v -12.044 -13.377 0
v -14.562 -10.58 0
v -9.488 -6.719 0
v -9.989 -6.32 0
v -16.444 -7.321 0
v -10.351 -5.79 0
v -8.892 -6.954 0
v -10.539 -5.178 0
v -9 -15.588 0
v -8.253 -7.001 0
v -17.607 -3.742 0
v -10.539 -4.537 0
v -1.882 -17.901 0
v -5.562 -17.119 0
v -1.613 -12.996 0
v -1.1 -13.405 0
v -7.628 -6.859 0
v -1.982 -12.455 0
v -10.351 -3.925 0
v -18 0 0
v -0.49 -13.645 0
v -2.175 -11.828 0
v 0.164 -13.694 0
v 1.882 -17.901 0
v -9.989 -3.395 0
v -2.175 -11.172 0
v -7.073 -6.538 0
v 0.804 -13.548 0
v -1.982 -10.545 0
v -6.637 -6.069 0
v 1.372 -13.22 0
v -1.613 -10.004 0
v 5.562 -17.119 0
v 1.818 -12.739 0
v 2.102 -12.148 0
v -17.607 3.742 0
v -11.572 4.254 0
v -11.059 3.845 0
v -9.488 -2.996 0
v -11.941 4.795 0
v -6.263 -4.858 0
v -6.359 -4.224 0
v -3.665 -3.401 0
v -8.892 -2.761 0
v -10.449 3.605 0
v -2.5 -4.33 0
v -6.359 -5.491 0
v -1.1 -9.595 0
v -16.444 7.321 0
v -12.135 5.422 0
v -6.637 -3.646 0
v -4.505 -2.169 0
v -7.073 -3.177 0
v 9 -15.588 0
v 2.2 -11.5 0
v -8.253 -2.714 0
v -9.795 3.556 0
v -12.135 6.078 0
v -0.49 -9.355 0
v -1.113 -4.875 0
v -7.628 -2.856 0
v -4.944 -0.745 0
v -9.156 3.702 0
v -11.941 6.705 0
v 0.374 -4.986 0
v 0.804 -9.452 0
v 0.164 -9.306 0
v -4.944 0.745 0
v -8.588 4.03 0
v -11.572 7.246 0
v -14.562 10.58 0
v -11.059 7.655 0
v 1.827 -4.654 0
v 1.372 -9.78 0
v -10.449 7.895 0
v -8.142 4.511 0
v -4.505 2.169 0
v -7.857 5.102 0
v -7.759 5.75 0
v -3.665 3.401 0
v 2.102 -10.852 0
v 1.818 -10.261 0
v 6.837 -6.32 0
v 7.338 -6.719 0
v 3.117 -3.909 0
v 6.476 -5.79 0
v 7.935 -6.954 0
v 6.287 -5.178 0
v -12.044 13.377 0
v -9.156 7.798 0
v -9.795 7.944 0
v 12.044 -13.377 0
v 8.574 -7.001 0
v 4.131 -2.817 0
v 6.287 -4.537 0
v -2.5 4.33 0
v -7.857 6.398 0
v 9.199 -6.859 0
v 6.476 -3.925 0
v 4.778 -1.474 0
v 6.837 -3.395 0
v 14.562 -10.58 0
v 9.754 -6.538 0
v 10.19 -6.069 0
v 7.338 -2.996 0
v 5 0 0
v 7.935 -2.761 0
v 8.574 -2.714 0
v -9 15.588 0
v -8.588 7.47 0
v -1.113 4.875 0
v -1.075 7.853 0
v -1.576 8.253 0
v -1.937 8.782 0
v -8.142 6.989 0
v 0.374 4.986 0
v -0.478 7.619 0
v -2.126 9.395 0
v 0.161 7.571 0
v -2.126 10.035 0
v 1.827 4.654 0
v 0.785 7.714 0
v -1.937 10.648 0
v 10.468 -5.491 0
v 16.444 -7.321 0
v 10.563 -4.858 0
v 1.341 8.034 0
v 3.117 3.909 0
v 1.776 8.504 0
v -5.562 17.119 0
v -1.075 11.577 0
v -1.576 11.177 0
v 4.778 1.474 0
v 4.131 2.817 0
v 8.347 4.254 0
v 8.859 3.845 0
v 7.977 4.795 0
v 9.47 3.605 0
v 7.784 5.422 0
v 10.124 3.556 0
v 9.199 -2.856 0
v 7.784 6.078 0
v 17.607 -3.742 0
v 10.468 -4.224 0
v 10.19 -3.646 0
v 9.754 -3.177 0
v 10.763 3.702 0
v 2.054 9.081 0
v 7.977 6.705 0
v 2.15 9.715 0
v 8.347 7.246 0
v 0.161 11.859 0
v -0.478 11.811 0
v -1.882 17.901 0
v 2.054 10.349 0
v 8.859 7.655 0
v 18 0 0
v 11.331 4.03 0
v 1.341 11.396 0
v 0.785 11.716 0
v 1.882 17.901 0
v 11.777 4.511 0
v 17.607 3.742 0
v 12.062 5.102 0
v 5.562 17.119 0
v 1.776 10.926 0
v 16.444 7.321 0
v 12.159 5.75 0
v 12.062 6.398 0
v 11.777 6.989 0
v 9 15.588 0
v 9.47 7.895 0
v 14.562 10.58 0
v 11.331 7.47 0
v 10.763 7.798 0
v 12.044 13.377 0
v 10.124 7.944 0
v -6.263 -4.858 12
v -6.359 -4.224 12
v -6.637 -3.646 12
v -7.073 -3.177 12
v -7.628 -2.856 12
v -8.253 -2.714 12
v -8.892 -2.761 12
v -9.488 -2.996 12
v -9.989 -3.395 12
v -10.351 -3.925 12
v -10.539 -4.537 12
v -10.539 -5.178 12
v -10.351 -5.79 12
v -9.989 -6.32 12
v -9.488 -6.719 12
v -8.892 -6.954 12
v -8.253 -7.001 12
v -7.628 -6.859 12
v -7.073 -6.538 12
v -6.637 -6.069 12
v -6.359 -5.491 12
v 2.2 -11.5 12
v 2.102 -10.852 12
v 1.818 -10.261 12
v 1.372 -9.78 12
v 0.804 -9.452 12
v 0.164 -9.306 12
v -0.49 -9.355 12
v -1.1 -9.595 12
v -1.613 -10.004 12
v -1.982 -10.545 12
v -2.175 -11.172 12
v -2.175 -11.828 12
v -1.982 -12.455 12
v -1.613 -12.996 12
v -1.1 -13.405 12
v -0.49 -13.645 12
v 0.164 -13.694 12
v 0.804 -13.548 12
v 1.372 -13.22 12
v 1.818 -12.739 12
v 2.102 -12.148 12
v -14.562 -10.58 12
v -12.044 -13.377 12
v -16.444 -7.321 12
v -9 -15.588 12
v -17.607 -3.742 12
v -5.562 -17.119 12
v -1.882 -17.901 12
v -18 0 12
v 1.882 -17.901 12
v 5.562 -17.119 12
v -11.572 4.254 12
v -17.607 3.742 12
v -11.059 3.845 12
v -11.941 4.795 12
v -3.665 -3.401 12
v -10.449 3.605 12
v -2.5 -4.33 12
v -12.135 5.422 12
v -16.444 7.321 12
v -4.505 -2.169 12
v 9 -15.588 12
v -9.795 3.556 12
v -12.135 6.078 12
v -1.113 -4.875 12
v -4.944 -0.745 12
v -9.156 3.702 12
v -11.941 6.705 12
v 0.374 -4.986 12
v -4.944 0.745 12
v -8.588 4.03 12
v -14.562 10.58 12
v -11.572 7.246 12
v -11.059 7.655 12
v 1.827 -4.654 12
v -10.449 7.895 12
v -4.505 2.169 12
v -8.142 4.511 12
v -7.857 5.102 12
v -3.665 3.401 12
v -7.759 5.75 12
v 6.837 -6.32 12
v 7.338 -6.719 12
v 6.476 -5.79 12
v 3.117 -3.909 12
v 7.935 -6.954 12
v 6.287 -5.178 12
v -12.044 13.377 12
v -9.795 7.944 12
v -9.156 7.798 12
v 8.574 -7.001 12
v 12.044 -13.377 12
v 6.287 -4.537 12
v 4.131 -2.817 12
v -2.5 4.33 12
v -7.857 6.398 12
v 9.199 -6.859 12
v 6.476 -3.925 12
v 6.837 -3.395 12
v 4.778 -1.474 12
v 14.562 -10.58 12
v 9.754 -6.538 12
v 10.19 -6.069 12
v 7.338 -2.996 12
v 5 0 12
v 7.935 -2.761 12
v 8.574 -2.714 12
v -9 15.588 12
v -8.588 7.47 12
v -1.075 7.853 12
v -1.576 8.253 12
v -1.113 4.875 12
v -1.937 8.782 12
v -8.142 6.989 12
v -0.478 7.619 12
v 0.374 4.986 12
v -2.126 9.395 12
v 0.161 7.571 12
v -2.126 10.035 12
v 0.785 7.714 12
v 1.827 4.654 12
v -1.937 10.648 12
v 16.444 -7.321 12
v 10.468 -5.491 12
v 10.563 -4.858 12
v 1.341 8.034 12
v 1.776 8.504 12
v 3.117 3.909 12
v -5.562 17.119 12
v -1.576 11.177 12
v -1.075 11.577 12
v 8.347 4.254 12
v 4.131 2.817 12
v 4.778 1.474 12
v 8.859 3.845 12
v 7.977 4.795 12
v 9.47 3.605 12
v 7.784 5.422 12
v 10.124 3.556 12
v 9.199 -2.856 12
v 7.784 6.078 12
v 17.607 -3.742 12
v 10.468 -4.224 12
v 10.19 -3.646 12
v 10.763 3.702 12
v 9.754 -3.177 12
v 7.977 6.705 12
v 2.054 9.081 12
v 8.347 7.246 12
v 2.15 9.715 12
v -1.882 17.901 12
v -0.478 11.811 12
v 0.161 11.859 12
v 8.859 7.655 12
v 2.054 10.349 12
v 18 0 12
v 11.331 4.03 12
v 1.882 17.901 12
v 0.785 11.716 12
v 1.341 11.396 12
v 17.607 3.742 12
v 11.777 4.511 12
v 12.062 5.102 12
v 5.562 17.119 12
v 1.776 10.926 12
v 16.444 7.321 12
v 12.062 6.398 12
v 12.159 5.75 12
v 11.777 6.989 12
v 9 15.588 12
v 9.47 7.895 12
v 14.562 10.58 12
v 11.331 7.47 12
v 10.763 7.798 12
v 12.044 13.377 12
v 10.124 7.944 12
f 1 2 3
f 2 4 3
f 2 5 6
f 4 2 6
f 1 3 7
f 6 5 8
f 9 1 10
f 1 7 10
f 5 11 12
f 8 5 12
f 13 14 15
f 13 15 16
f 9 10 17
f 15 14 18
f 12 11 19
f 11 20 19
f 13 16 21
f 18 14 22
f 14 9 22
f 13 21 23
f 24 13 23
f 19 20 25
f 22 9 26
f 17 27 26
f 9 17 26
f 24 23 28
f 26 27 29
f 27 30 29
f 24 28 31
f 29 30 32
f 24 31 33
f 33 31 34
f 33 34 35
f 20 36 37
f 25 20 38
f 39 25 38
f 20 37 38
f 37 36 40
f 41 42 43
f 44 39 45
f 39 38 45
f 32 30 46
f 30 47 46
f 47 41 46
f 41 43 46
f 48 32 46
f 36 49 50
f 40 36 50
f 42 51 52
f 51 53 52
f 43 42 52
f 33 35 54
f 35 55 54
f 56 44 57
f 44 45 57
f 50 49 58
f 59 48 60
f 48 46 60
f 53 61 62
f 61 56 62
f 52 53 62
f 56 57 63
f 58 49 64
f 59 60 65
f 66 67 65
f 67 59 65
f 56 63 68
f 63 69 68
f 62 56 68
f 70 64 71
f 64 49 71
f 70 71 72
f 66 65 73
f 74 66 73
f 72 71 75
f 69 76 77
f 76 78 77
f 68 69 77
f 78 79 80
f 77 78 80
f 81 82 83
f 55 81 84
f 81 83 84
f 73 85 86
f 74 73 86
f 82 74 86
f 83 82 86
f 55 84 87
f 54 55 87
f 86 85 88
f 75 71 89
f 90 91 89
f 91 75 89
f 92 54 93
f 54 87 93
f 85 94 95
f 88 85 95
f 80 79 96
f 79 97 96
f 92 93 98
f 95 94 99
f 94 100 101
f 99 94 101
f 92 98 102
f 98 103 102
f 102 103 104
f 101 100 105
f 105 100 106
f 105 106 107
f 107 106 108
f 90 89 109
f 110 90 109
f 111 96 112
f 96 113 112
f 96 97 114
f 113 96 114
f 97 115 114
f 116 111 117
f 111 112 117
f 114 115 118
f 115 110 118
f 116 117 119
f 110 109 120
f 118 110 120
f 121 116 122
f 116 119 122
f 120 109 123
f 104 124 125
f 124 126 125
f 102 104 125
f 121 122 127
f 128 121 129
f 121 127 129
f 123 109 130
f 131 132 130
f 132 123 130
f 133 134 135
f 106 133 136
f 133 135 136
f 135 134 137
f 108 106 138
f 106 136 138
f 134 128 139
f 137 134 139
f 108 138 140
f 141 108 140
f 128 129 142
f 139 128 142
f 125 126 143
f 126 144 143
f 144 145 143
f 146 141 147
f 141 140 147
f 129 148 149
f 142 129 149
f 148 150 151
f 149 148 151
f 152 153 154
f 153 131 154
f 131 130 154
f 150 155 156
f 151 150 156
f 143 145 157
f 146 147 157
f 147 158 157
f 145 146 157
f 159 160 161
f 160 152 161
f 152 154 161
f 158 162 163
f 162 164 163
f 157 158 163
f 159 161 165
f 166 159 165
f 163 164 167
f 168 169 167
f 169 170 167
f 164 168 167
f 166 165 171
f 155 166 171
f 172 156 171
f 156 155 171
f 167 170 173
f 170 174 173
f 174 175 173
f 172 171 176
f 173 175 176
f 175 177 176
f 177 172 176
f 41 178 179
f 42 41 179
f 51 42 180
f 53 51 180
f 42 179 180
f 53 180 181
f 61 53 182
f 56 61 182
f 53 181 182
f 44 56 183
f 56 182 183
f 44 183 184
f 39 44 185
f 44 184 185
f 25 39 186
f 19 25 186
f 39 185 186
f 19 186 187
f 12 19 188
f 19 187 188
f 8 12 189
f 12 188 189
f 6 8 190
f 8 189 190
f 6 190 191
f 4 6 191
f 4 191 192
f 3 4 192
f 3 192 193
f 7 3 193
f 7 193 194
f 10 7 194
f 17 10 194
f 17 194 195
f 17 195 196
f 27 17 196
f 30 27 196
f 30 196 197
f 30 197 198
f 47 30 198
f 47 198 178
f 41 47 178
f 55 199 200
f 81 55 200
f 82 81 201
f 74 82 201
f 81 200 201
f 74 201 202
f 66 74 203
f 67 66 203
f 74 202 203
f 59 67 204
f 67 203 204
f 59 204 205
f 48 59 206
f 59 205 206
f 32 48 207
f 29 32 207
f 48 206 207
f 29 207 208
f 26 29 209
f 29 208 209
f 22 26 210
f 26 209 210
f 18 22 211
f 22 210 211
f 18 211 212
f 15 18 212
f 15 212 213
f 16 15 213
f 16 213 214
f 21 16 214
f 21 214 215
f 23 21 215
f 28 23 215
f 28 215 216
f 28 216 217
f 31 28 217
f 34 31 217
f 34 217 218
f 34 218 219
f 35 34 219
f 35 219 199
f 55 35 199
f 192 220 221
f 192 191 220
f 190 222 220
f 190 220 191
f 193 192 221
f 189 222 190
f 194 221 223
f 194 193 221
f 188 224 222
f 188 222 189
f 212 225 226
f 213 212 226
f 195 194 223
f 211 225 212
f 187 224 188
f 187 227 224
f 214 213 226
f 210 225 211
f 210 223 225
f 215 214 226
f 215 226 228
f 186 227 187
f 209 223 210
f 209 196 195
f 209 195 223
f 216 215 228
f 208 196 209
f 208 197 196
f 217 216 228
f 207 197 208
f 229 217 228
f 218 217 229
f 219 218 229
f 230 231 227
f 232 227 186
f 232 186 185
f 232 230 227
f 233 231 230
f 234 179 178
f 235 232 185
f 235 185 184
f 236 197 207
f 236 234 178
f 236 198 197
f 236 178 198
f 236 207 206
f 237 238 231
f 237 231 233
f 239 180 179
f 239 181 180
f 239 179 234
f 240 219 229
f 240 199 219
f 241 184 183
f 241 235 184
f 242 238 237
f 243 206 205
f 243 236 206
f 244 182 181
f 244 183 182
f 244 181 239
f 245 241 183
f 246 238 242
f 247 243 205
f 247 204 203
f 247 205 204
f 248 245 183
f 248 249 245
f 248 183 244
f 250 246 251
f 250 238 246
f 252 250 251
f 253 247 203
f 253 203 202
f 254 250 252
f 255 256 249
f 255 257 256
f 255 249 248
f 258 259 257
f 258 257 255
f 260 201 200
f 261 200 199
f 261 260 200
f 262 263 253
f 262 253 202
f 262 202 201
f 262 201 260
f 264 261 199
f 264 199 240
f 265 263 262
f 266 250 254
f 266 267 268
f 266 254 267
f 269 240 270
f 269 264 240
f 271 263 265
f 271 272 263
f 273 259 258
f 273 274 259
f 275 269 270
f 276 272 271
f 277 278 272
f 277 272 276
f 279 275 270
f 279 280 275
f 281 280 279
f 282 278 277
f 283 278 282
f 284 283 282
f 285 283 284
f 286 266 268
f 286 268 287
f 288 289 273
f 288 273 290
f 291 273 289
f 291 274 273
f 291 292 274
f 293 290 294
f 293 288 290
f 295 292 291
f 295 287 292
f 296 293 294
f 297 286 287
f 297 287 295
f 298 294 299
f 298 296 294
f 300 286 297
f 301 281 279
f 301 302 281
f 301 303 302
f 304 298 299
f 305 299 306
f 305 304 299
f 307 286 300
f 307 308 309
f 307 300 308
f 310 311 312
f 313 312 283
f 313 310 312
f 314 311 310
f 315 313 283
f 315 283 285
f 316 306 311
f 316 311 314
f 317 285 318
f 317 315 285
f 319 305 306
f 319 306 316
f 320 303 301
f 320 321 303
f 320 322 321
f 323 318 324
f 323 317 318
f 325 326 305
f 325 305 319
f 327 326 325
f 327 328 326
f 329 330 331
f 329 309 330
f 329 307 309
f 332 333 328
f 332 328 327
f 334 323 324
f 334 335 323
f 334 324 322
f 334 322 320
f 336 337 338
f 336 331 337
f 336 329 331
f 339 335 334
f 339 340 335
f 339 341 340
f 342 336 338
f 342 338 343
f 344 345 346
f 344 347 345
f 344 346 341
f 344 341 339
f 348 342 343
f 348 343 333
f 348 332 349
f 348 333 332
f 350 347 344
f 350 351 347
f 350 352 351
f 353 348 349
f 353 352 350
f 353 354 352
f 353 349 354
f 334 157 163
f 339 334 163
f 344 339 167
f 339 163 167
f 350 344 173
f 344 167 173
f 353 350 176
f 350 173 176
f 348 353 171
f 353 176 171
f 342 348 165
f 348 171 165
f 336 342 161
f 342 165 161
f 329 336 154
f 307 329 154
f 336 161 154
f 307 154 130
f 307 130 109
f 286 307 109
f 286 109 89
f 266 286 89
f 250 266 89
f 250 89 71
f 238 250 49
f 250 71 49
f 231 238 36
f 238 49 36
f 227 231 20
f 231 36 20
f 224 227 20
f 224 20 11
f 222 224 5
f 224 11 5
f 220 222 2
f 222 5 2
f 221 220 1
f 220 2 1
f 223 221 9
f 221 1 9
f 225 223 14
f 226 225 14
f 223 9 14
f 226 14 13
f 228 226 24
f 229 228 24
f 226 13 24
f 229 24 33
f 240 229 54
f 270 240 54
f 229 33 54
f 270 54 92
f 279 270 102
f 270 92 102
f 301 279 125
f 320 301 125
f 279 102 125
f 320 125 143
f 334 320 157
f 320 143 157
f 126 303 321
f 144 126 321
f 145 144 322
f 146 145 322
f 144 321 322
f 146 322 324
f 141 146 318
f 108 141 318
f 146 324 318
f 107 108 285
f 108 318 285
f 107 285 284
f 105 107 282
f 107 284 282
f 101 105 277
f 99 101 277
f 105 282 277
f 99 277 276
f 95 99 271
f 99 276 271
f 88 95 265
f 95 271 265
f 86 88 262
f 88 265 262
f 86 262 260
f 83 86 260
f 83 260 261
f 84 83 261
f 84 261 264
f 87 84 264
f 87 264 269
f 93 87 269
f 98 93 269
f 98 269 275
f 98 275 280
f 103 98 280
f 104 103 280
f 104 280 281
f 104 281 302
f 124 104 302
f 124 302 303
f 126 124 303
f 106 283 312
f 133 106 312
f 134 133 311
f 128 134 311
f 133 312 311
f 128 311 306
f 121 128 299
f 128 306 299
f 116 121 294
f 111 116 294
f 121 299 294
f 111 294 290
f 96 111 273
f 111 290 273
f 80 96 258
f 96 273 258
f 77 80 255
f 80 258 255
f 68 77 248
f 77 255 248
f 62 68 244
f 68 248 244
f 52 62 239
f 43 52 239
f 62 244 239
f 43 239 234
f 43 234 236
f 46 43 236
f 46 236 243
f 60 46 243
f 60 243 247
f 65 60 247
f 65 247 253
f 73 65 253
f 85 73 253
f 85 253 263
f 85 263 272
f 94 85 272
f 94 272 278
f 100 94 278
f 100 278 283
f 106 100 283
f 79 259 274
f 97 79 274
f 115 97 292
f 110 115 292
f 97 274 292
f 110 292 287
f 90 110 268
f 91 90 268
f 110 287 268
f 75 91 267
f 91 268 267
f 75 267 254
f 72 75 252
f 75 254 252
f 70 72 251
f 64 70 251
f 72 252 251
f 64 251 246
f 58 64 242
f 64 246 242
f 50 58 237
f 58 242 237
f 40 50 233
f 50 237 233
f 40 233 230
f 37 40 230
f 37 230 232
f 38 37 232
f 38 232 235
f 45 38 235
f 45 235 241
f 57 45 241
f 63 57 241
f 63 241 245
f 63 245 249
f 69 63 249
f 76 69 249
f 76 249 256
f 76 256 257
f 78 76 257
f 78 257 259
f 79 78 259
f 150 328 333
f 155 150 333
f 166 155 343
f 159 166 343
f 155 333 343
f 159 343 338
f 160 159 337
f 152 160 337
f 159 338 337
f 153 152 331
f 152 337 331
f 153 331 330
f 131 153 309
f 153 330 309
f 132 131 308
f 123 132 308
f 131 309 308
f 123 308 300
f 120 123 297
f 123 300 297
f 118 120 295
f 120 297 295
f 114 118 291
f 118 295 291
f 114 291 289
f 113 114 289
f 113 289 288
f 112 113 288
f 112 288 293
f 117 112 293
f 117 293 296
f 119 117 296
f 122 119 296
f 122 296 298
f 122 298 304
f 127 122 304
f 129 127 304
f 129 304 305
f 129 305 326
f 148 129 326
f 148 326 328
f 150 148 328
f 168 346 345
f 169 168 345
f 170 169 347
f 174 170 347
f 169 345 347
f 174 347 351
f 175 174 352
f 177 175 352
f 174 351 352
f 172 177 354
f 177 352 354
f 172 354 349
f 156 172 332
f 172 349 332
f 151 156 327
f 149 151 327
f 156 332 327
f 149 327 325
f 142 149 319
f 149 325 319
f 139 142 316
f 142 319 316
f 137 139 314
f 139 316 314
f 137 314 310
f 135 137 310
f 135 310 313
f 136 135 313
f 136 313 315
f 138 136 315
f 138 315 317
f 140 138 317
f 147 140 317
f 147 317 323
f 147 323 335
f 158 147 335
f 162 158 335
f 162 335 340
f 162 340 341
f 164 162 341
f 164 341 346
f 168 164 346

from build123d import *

# Parameters (mm, degrees)
SKETCH_1_R          = 18
EXTRUDE_1_DEPTH     = 12
SKETCH_3_R          = 2.15
SKETCH_3_R_2        = 2.2
CUT_EXTRUDE_1_DEPTH = 29.142494559
SKETCH_4_R          = 5
CUT_EXTRUDE_2_DEPTH = 29.142494559


with BuildPart() as part:
    # 草图1 → 凸台-拉伸1 (new body)
    with BuildSketch(Plane.XY):
        Circle(SKETCH_1_R)
    extrude(amount=EXTRUDE_1_DEPTH)

    # 草图3 → 切除-拉伸1 (cut, through all)
    with BuildSketch(Plane.XY.offset(12)):
        with Locations((0, 9.715)):
            Circle(SKETCH_3_R)
        with Locations((8.413436798, -4.8575)):
            Circle(SKETCH_3_R)
        with Locations((-8.413436798, -4.8575)):
            Circle(SKETCH_3_R)
        with Locations((9.959292144, 5.75)):
            Circle(SKETCH_3_R_2)
        with Locations((0, -11.5)):
            Circle(SKETCH_3_R_2)
        with Locations((-9.959292144, 5.75)):
            Circle(SKETCH_3_R_2)
    extrude(amount=-CUT_EXTRUDE_1_DEPTH, mode=Mode.SUBTRACT)

    # 草图4 → 切除-拉伸2 (cut, through all)
    with BuildSketch(Plane.XY.offset(12)):
        Circle(SKETCH_4_R)
    extrude(amount=-CUT_EXTRUDE_2_DEPTH, mode=Mode.SUBTRACT)


solid = part.part
